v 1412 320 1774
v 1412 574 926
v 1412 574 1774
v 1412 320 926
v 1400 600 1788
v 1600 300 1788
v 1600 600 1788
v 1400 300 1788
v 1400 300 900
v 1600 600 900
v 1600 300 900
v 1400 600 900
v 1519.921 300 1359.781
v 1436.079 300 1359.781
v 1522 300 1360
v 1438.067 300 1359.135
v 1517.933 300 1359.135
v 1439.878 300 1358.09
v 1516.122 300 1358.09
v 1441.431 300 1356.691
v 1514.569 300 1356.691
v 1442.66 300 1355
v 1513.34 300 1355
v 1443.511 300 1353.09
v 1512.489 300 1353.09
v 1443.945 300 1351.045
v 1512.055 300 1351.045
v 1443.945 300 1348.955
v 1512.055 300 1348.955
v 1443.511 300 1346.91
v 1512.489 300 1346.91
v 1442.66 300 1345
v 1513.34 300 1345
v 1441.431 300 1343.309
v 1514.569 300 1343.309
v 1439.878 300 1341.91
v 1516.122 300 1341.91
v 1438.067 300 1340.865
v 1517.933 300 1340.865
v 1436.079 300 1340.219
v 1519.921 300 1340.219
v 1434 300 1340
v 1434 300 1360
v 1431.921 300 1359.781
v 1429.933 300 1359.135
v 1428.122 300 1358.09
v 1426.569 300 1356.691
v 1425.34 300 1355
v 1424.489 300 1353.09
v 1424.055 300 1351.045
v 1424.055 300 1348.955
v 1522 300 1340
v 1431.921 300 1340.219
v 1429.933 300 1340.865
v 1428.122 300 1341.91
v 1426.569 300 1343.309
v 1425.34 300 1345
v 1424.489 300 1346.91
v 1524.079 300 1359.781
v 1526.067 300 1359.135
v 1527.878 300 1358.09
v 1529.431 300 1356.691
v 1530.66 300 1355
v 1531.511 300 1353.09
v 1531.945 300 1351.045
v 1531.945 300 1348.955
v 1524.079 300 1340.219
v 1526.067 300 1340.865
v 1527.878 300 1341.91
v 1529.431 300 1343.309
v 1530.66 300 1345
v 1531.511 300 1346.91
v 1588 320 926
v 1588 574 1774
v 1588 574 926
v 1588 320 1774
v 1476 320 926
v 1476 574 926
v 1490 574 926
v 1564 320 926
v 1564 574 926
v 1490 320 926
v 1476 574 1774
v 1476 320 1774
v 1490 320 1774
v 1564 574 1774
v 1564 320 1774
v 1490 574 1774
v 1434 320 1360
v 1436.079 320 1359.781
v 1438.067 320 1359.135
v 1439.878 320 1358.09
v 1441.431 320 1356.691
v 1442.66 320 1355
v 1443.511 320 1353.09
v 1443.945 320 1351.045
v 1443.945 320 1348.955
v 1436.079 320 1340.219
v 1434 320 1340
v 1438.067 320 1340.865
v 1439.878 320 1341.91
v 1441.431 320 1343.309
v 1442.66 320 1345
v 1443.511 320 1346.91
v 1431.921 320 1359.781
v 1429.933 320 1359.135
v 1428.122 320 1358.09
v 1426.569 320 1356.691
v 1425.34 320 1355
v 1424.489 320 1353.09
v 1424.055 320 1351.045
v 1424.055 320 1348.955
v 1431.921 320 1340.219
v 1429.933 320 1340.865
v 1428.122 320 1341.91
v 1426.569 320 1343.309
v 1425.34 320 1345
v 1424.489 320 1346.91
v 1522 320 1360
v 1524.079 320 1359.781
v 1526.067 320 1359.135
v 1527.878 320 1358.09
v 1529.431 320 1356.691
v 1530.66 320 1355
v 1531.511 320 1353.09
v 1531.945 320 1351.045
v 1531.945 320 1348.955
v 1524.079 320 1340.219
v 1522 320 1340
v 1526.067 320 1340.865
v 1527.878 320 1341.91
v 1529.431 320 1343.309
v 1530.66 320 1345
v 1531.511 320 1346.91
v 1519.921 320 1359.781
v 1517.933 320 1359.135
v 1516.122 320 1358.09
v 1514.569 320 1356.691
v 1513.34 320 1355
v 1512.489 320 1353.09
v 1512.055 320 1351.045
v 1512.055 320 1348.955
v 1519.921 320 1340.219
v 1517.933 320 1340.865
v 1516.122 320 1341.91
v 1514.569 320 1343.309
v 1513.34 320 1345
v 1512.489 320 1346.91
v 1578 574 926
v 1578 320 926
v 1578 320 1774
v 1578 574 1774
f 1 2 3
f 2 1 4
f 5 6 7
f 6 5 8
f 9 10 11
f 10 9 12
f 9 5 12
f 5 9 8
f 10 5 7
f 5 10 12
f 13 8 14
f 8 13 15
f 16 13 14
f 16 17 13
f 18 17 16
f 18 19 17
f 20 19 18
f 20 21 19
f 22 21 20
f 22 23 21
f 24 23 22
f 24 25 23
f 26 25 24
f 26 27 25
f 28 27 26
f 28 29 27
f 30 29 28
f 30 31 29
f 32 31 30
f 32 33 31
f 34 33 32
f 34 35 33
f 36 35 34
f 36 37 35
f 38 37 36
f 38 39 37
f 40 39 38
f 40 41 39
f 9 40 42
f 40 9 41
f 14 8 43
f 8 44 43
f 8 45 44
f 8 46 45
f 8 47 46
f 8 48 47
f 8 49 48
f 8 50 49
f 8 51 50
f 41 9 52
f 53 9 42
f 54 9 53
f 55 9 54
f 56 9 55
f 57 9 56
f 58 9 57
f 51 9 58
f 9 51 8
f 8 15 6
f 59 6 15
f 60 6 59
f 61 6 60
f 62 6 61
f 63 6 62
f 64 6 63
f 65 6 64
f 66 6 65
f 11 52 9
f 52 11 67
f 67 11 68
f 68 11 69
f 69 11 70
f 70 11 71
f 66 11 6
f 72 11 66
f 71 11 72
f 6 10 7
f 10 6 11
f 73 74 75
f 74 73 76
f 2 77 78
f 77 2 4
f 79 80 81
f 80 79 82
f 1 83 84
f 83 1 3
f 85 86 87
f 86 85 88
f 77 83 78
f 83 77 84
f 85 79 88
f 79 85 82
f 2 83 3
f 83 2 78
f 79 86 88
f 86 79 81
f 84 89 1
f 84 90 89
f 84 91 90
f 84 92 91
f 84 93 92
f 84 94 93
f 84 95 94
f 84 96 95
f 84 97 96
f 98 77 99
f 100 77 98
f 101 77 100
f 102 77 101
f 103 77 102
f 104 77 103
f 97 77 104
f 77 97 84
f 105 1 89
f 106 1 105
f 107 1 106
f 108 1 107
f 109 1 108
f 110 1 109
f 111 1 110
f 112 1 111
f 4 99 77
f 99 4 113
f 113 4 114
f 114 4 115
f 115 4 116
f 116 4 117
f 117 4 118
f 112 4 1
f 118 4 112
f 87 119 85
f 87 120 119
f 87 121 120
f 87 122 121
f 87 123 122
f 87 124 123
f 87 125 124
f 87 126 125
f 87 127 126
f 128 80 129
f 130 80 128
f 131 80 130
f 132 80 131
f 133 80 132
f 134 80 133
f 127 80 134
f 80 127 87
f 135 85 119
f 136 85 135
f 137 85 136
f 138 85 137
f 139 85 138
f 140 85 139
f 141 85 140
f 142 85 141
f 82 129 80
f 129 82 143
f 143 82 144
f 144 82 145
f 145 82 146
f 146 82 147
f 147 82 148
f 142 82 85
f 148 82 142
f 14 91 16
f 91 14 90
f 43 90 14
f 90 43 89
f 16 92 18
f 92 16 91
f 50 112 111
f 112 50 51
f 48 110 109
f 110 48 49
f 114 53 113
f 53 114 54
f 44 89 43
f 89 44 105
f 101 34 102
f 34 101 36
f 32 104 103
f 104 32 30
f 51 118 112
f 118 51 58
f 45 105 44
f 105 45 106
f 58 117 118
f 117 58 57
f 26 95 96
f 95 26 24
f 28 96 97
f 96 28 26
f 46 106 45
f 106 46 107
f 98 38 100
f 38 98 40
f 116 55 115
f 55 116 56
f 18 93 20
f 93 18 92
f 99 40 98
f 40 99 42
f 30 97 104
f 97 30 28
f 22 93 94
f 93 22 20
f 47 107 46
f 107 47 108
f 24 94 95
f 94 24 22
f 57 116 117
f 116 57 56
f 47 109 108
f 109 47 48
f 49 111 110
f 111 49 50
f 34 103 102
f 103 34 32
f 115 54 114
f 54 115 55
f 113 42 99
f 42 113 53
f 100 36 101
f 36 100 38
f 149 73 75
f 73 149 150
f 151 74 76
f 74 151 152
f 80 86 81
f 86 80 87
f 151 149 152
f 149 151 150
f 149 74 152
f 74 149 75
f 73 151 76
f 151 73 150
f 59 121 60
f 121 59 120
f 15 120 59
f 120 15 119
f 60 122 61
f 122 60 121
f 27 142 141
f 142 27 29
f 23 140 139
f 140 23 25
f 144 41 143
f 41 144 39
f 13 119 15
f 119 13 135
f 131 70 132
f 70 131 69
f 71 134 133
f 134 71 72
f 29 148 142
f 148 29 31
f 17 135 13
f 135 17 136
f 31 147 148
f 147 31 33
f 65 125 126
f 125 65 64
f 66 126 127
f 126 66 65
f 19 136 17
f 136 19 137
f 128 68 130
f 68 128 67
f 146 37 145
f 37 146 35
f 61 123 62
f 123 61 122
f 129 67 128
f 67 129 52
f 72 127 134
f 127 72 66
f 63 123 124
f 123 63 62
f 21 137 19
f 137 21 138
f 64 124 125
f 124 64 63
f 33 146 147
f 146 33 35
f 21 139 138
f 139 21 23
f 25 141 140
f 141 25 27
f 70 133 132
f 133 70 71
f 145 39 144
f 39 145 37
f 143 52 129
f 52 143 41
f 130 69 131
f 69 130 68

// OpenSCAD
// file: dovetail-drawer.scad
/*

    Dovetail Drawer
    
    By Anton Augustsson


*/

// use dovtail library

module dovetailDrawer (
    thicknessBottom,
    thicknessSide,
    thicknessFront,
    lenghtDrawer,
    widthDrawer,
    heightDrawer,
    xDrawer,yDrawer,zDrawer,
    yRotate
    ){
/*
    ---------- Local varibles ---------- 
*/

length = lenghtDrawer;
width  = widthDrawer;
height = heightDrawer;

x=xDrawer;
y=yDrawer;
z=zDrawer;

/*
    ---------- Code ---------- 
*/

translate([
    x,
    y,
    z]) 
rotate([0,yRotate,0])
difference () {
union () {

// Left
color("Wheat")
translate([
    0,
    thicknessFront/4,
    0]) 
cube(size = [
    thicknessSide,
    length-thicknessFront/4,
    height]);

// Right
color("Wheat")
translate([
    width-thicknessSide,
    thicknessFront/4,
    0]) 
cube(size = [
    thicknessSide,
    length-thicknessFront/4,
    height]);
    
// Bottom 
color("Wheat")
translate([
    thicknessSide/2,
    thicknessFront,
    10]) 
cube(size = [
    width-thicknessSide,
    length-thicknessFront-thicknessSide,
    thicknessBottom]);

// Back
color("Wheat")
translate([
    0,
    length-thicknessSide,
    0]) 
cube(size = [
    width,
    thicknessSide,
    height]);

// Front
color("BurlyWood")
translate([
    0,
    0,
    0]) 
cube(size = [
    width,
    thicknessFront,
    height]);    
}


translate([
    width/2,                   
    -1,   
    height/4*3
    ])  
rotate([270,0,0])
cylinder(
    h = thicknessFront+2,    
    r = 10        
    );      

}}
    
/*
    ---------- Example ---------- 
*/


thicknessBottom = 14;
thicknessSide   = 14;
thicknessFront  = 20;

length = 500;
width  = 600;
height = 100;


x=0;
y=0;
z=0;
yRotate=0;

dovetailDrawer (
    thicknessBottom,
    thicknessSide,
    thicknessFront,
    length,
    width,
    height,
    x,y,z,
    yRotate
    );
// file: cabinet.scad
/*

    Cabinet
    
    By Anton Augustsson


*/

module cabinet (
    thickness,
    length,
    width,
    height
    ){
/*
    ---------- Local varibles ---------- 
*/



/*
    ---------- Code ---------- 
*/


union () {

// Left
translate([
    0,
    0,
    0]) 
cube(size = [
    thickness,
    width,
    height-thickness]);

// Right
translate([
    length-thickness,
    0,
    0]) 
cube(size = [
    thickness,
    width,
    height-thickness]);
    
// Bottom 
translate([
    thickness,
    0,
    0]) 
cube(size = [
    length
    -thickness*2,
    width-thickness,
    thickness]);

// Back
translate([
    thickness,
    width-thickness,
    0]) 
cube(size = [
    length
    -thickness*2,
    thickness,
    height-thickness]);
}}



/*
    ---------- Example ---------- 
*/


thickness = 12;

length = 600;
width  = 600;
height = 900;

cabinet (
    thickness,
    length,
    width,
    height
    );
// main file
/*

    Tird Section Right Cabinet
    
    By Anton Augustsson


*/

use <cabinet.scad>;
use <dovetail-drawer.scad>;

module tirdSectionRightCabinet (
    plywoodThickness,
    lengthMiddleSection,
    lengthSecondSection,
    length,
    widthCabinet,
    widthCabinetDoor,
    widthTable,
    width,
    heightTable,
    heightCabinet,
    x,y,z
    ){

/*
    ---------- Local varibles ---------- 
*/

thickness = plywoodThickness;

length = lengthTirdSection;
width  = widthCabinet;
height = heightCabinet;

/*
    ---------- Code ---------- 
*/


translate([
	x,
	y,
	z,])

union () {

cabinet (
    thickness,
    length,
    width,
    height
    );
    
dovetailDrawer (
    14,
    14,
    20,
    width-thickness,
    height-thickness*2,
    (length-thickness*2)/2,
    thickness+(length-thickness*2)/2,
    0,
    thickness,
    -90
    );
    
dovetailDrawer (
    14,
    14,
    20,
    width-thickness,
    height-thickness*2,
    (length-thickness*2)/2,
    (length-thickness*2)+thickness,0,thickness,
    -90
    );
}}



/*
    ---------- Example ---------- 
*/


plywoodThickness = 12;

lengthMiddleSection = 600;
lengthSecondSection = lengthMiddleSection/2;
lengthTirdSection   = 200;
length=lengthMiddleSection
    +lengthSecondSection*2
    +lengthTirdSection*2;

widthCabinet     = 300;
widthCabinetDoor = widthCabinet/3;
widthTable       = 300;
width            = widthCabinet+widthTable;

heightTable   = 900;
heightCabinet = 900;


x=lengthMiddleSection+
    lengthSecondSection*2+lengthTirdSection;
y=width-widthCabinet;
z=heightTable;

tirdSectionRightCabinet (
    plywoodThickness,
    lengthMiddleSection,
    lengthSecondSection,
    length,
    widthCabinet,
    widthCabinetDoor,
    widthTable,
    width,
    heightTable,
    heightCabinet,
    x,y,z
    );
